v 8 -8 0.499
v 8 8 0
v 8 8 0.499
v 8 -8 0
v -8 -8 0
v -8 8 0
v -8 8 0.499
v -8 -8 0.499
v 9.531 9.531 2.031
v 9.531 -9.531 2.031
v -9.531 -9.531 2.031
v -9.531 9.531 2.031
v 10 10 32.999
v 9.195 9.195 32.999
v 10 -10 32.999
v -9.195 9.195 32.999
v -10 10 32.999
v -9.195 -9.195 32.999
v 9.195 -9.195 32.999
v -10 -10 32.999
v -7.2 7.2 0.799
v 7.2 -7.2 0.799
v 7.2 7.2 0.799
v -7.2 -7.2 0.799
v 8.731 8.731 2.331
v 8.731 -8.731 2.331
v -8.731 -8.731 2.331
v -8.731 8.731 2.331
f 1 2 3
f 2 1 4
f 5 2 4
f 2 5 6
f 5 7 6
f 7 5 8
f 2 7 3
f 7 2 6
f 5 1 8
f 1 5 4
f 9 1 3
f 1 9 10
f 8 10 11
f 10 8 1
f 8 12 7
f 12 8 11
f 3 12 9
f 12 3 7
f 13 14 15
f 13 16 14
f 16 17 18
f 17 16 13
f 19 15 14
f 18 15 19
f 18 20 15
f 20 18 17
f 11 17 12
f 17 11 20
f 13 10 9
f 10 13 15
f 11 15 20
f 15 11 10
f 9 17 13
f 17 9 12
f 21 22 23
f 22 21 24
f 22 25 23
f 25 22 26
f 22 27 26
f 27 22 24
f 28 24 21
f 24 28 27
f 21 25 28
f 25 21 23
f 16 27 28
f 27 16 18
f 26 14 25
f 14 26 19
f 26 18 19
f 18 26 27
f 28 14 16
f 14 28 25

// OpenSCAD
// file: ../assorter.scad
// Variables

e=0.001;

x = 2;
y = 3;

//box();
//grid();
//slice();
//stack();

function middle(times) = -length_default/2 +(length_default+(times-1)*pitch_default)/2 ;
left   = -length_default/2 ;
front  = -length_default/2 ;
right  =  length_default/2+(x-1)*pitch_default ;
back   =  length_default/2+(y-1)*pitch_default ;
bottom =  0;
top    =  height_default;


grid_height = lift_default + triangle_height_default - cut_default ;

module body_form(
A,B,K,L,height
){
    polyhedron(
        points = [
            [-A,-B, 0],  // 0
            [ A,-B, 0],   // 1
            [ A, B, 0],  // 2
            [-A, B, 0], // 3
            [-K,-L, height],  // 0
            [ K,-L, height],   // 1
            [ K, L, height],  // 2
            [-K, L, height]], // 3
        faces = [
            [0,1,2,3],  // bottom
            [4,5,1,0],  // front
            [7,6,5,4],  // top
            [5,6,2,1],  // right
            [6,7,3,2],  // back
            [7,4,0,3]] // left
        );
}

module box_bottom(
  lift = lift_default,
  length = length_default,
  height = height_default ,
  triangle_height = triangle_height_default,
  bottom = true, // if the bottom should be added or not... (the inner one should not have it)
){

    // größere
    K = length/2 ;
    L = K;
    // kleinere
    A = (length-2*triangle_height)/2;
    B = A;
    remaining_height = height - lift - triangle_height;
    if (bottom) {
    translate([0,0,(lift+1)/2])
        cube([2*A,2*B,lift+1],center=true);
    }
    translate([0,0,lift-e])
    // creates an inverted cut pyramid
    body_form(A,B,K,L,triangle_height+e);

}

module solid_box(
  x = x,
  y = y,
  lift = lift_default,
  length = length_default,
  height = height_default ,
  triangle_height = triangle_height_default,
  pitch = pitch_default,
  bottom = true,
  cut_sides = true,
  fill_pyramid_tip = false,
){
    difference(){
    union(){
        remaining_height = height - lift - triangle_height;
        for (m = [0:y-1]){
            for (n = [0:x-1])
                translate([n*pitch,m*pitch,0])
                    box_bottom(length=length,bottom=bottom);
        }
        translate([-length/2,-length/2,lift + triangle_height-e])
            cube([(x-1)*pitch+length,(y-1)*pitch +length,remaining_height]);

        if (fill_pyramid_tip){
            // fill the gaps inside the pyramids *shrug*
            translate([-length/2,-length/2,triangle_height+0.1])
                cube([(x-1)*pitch+length,(y-1)*pitch +length,1]);
        }
    }
    if (cut_sides) {
        // cut left side of box
        translate([-length/2,-length/2-2,0])
            cut_object(length = (y-1)*pitch +length +4 );

        // cut right side of box
        translate([(x-1)*pitch+length/2,-length/2-2,0])
        mirror(v=[1,0,0])
            cut_object(length = (y-1)*pitch +length +4 );

        // cut front side of box
        //translate([(x-1)*pitch+length/2,-length/2-2,0])
        translate([-length/2-2,-length/2,0])
        rotate([0,0,-90])
        mirror(v=[1,0,0])
            cut_object(length = (x-1)*pitch +length +4 );

        // cut back side of box
        translate([-length/2-2,length/2+(y-1)*pitch,0])
        rotate([0,0,-90])
            cut_object(length = (x-1)*pitch +length +4 );
        }
    }

}

module box(handle_enable = true){
    difference(){
        solid_box(fill_pyramid_tip=true);
        // inner solid box without the cubed lift on the bottom.. now the wall thickness looks quite okay
        // we have to lower the innter box about lift_default distance again
        translate([0,0,wall_thickness_default- lift_default])
            solid_box(length = length_default - 2* wall_thickness_default,bottom=false);
    }
    if (handle_enable) {
        // add handle
        translate([
            middle(x),
            -length_default/2+wall_thickness_default,
            height_default-handle_top_distance
        ])
            handle();
    }
}

module grid(
  x = x,
  y = y,
  lift = lift_default,
  length = length_default,
  height = height_default ,
  triangle_height = triangle_height_default,
  pitch = pitch_default
){
    difference(){
    // main body
        union(){
            difference(){
                translate([-length/2,-length/2,0])
                cube([(x-1)*pitch+length,(y-1)*pitch +length,lift+triangle_height]);

                translate([0,0,-e])
                    solid_box(length= length_default + 0.1, cut_sides = false );     // do we need some added clearence here?
            }
        }

    translate([-length/2-1,-length/2-1,lift + triangle_height - cut_default])
        cube([(x-1)*pitch+length+2,(y-1)*pitch +length + 2,2]);
    }
}


module cut_object(
    length = length_default,
    height = height_default,
    diff_bottom = diff_bottom_default,

){
    rotate([-90,0,0])
    linear_extrude(height=length)

        polygon(
            [   [-e,0],
                [-e,-height],
                [0,-height],
                [diff_bottom,0]
            ]
            );
}

module slice() {
    difference(){
        box();
        translate([-length_default/2-10,-length_default/2-10,-5])
        cube([
            1/2*(length_default+(x-1)*pitch_default + 20),
            length_default+(y-1)*pitch_default +20,
            height_default+10]);
    }
}

module handle(){
    r = 2;
    $fa = 1;
    $fs = 0.4;

    rotate([0,180,0])
    hull(){
        hull(){
            //left corner
            translate([-handle_width/2,0,0])
                cube([1,1,handle_top_height ]);

            // right corner
            translate([handle_width/2,0,0])
            translate([-1,0,0])
                cube([1,1,handle_top_height ]);

            // left round corner
            translate([-handle_width/2,handle_depth])
            translate([r,-r,0])
            cylinder(r=r,h=handle_top_height);

            // right round corner
            translate([handle_width/2,handle_depth])
            translate([-r,-r,0])
            cylinder(r=r,h=handle_top_height );
        }

        // hull anchor
        height = handle_depth / tan(handle_angle);

        translate([-handle_width/2,0,0])
            cube([handle_width,0.1,height]);
    }
}

module stack(){
    // module to preview a stacked box
    slice();
    translate([0,0,height_default-handle_top_distance ])
    slice();
}
// file: defaults.scad
/*
set of variables for the micro drawer-cabinet version
each box is 62.5 by 120 mm in Size
With this Settings 3 by 6 boxes fit in each drawer
*/

length_default = 20 ;
pitch_default  = 20 ;

height_default = 33; // in theory 35, but then they have to sit perfectly to not block the schublade

triangle_height_default = 2 ;
triangle_width_default  = 2 * triangle_height_default;
cut_default=0.75;
lift_default=0.5;

wall_thickness_default = 0.8;

handle_enable = false;
handle_width = 15;
handle_depth = 7;

handle_top_height = 1;
handle_angle = 45; // degree
handle_top_distance = 1.75; // am gedruckten objekt zu prüfen

diff_bottom_default = 0.5;
// main file
// boxes ;-D

include <defaults.scad>
include <../assorter.scad>

x = 1;
y = 1;

box(handle_enable);
